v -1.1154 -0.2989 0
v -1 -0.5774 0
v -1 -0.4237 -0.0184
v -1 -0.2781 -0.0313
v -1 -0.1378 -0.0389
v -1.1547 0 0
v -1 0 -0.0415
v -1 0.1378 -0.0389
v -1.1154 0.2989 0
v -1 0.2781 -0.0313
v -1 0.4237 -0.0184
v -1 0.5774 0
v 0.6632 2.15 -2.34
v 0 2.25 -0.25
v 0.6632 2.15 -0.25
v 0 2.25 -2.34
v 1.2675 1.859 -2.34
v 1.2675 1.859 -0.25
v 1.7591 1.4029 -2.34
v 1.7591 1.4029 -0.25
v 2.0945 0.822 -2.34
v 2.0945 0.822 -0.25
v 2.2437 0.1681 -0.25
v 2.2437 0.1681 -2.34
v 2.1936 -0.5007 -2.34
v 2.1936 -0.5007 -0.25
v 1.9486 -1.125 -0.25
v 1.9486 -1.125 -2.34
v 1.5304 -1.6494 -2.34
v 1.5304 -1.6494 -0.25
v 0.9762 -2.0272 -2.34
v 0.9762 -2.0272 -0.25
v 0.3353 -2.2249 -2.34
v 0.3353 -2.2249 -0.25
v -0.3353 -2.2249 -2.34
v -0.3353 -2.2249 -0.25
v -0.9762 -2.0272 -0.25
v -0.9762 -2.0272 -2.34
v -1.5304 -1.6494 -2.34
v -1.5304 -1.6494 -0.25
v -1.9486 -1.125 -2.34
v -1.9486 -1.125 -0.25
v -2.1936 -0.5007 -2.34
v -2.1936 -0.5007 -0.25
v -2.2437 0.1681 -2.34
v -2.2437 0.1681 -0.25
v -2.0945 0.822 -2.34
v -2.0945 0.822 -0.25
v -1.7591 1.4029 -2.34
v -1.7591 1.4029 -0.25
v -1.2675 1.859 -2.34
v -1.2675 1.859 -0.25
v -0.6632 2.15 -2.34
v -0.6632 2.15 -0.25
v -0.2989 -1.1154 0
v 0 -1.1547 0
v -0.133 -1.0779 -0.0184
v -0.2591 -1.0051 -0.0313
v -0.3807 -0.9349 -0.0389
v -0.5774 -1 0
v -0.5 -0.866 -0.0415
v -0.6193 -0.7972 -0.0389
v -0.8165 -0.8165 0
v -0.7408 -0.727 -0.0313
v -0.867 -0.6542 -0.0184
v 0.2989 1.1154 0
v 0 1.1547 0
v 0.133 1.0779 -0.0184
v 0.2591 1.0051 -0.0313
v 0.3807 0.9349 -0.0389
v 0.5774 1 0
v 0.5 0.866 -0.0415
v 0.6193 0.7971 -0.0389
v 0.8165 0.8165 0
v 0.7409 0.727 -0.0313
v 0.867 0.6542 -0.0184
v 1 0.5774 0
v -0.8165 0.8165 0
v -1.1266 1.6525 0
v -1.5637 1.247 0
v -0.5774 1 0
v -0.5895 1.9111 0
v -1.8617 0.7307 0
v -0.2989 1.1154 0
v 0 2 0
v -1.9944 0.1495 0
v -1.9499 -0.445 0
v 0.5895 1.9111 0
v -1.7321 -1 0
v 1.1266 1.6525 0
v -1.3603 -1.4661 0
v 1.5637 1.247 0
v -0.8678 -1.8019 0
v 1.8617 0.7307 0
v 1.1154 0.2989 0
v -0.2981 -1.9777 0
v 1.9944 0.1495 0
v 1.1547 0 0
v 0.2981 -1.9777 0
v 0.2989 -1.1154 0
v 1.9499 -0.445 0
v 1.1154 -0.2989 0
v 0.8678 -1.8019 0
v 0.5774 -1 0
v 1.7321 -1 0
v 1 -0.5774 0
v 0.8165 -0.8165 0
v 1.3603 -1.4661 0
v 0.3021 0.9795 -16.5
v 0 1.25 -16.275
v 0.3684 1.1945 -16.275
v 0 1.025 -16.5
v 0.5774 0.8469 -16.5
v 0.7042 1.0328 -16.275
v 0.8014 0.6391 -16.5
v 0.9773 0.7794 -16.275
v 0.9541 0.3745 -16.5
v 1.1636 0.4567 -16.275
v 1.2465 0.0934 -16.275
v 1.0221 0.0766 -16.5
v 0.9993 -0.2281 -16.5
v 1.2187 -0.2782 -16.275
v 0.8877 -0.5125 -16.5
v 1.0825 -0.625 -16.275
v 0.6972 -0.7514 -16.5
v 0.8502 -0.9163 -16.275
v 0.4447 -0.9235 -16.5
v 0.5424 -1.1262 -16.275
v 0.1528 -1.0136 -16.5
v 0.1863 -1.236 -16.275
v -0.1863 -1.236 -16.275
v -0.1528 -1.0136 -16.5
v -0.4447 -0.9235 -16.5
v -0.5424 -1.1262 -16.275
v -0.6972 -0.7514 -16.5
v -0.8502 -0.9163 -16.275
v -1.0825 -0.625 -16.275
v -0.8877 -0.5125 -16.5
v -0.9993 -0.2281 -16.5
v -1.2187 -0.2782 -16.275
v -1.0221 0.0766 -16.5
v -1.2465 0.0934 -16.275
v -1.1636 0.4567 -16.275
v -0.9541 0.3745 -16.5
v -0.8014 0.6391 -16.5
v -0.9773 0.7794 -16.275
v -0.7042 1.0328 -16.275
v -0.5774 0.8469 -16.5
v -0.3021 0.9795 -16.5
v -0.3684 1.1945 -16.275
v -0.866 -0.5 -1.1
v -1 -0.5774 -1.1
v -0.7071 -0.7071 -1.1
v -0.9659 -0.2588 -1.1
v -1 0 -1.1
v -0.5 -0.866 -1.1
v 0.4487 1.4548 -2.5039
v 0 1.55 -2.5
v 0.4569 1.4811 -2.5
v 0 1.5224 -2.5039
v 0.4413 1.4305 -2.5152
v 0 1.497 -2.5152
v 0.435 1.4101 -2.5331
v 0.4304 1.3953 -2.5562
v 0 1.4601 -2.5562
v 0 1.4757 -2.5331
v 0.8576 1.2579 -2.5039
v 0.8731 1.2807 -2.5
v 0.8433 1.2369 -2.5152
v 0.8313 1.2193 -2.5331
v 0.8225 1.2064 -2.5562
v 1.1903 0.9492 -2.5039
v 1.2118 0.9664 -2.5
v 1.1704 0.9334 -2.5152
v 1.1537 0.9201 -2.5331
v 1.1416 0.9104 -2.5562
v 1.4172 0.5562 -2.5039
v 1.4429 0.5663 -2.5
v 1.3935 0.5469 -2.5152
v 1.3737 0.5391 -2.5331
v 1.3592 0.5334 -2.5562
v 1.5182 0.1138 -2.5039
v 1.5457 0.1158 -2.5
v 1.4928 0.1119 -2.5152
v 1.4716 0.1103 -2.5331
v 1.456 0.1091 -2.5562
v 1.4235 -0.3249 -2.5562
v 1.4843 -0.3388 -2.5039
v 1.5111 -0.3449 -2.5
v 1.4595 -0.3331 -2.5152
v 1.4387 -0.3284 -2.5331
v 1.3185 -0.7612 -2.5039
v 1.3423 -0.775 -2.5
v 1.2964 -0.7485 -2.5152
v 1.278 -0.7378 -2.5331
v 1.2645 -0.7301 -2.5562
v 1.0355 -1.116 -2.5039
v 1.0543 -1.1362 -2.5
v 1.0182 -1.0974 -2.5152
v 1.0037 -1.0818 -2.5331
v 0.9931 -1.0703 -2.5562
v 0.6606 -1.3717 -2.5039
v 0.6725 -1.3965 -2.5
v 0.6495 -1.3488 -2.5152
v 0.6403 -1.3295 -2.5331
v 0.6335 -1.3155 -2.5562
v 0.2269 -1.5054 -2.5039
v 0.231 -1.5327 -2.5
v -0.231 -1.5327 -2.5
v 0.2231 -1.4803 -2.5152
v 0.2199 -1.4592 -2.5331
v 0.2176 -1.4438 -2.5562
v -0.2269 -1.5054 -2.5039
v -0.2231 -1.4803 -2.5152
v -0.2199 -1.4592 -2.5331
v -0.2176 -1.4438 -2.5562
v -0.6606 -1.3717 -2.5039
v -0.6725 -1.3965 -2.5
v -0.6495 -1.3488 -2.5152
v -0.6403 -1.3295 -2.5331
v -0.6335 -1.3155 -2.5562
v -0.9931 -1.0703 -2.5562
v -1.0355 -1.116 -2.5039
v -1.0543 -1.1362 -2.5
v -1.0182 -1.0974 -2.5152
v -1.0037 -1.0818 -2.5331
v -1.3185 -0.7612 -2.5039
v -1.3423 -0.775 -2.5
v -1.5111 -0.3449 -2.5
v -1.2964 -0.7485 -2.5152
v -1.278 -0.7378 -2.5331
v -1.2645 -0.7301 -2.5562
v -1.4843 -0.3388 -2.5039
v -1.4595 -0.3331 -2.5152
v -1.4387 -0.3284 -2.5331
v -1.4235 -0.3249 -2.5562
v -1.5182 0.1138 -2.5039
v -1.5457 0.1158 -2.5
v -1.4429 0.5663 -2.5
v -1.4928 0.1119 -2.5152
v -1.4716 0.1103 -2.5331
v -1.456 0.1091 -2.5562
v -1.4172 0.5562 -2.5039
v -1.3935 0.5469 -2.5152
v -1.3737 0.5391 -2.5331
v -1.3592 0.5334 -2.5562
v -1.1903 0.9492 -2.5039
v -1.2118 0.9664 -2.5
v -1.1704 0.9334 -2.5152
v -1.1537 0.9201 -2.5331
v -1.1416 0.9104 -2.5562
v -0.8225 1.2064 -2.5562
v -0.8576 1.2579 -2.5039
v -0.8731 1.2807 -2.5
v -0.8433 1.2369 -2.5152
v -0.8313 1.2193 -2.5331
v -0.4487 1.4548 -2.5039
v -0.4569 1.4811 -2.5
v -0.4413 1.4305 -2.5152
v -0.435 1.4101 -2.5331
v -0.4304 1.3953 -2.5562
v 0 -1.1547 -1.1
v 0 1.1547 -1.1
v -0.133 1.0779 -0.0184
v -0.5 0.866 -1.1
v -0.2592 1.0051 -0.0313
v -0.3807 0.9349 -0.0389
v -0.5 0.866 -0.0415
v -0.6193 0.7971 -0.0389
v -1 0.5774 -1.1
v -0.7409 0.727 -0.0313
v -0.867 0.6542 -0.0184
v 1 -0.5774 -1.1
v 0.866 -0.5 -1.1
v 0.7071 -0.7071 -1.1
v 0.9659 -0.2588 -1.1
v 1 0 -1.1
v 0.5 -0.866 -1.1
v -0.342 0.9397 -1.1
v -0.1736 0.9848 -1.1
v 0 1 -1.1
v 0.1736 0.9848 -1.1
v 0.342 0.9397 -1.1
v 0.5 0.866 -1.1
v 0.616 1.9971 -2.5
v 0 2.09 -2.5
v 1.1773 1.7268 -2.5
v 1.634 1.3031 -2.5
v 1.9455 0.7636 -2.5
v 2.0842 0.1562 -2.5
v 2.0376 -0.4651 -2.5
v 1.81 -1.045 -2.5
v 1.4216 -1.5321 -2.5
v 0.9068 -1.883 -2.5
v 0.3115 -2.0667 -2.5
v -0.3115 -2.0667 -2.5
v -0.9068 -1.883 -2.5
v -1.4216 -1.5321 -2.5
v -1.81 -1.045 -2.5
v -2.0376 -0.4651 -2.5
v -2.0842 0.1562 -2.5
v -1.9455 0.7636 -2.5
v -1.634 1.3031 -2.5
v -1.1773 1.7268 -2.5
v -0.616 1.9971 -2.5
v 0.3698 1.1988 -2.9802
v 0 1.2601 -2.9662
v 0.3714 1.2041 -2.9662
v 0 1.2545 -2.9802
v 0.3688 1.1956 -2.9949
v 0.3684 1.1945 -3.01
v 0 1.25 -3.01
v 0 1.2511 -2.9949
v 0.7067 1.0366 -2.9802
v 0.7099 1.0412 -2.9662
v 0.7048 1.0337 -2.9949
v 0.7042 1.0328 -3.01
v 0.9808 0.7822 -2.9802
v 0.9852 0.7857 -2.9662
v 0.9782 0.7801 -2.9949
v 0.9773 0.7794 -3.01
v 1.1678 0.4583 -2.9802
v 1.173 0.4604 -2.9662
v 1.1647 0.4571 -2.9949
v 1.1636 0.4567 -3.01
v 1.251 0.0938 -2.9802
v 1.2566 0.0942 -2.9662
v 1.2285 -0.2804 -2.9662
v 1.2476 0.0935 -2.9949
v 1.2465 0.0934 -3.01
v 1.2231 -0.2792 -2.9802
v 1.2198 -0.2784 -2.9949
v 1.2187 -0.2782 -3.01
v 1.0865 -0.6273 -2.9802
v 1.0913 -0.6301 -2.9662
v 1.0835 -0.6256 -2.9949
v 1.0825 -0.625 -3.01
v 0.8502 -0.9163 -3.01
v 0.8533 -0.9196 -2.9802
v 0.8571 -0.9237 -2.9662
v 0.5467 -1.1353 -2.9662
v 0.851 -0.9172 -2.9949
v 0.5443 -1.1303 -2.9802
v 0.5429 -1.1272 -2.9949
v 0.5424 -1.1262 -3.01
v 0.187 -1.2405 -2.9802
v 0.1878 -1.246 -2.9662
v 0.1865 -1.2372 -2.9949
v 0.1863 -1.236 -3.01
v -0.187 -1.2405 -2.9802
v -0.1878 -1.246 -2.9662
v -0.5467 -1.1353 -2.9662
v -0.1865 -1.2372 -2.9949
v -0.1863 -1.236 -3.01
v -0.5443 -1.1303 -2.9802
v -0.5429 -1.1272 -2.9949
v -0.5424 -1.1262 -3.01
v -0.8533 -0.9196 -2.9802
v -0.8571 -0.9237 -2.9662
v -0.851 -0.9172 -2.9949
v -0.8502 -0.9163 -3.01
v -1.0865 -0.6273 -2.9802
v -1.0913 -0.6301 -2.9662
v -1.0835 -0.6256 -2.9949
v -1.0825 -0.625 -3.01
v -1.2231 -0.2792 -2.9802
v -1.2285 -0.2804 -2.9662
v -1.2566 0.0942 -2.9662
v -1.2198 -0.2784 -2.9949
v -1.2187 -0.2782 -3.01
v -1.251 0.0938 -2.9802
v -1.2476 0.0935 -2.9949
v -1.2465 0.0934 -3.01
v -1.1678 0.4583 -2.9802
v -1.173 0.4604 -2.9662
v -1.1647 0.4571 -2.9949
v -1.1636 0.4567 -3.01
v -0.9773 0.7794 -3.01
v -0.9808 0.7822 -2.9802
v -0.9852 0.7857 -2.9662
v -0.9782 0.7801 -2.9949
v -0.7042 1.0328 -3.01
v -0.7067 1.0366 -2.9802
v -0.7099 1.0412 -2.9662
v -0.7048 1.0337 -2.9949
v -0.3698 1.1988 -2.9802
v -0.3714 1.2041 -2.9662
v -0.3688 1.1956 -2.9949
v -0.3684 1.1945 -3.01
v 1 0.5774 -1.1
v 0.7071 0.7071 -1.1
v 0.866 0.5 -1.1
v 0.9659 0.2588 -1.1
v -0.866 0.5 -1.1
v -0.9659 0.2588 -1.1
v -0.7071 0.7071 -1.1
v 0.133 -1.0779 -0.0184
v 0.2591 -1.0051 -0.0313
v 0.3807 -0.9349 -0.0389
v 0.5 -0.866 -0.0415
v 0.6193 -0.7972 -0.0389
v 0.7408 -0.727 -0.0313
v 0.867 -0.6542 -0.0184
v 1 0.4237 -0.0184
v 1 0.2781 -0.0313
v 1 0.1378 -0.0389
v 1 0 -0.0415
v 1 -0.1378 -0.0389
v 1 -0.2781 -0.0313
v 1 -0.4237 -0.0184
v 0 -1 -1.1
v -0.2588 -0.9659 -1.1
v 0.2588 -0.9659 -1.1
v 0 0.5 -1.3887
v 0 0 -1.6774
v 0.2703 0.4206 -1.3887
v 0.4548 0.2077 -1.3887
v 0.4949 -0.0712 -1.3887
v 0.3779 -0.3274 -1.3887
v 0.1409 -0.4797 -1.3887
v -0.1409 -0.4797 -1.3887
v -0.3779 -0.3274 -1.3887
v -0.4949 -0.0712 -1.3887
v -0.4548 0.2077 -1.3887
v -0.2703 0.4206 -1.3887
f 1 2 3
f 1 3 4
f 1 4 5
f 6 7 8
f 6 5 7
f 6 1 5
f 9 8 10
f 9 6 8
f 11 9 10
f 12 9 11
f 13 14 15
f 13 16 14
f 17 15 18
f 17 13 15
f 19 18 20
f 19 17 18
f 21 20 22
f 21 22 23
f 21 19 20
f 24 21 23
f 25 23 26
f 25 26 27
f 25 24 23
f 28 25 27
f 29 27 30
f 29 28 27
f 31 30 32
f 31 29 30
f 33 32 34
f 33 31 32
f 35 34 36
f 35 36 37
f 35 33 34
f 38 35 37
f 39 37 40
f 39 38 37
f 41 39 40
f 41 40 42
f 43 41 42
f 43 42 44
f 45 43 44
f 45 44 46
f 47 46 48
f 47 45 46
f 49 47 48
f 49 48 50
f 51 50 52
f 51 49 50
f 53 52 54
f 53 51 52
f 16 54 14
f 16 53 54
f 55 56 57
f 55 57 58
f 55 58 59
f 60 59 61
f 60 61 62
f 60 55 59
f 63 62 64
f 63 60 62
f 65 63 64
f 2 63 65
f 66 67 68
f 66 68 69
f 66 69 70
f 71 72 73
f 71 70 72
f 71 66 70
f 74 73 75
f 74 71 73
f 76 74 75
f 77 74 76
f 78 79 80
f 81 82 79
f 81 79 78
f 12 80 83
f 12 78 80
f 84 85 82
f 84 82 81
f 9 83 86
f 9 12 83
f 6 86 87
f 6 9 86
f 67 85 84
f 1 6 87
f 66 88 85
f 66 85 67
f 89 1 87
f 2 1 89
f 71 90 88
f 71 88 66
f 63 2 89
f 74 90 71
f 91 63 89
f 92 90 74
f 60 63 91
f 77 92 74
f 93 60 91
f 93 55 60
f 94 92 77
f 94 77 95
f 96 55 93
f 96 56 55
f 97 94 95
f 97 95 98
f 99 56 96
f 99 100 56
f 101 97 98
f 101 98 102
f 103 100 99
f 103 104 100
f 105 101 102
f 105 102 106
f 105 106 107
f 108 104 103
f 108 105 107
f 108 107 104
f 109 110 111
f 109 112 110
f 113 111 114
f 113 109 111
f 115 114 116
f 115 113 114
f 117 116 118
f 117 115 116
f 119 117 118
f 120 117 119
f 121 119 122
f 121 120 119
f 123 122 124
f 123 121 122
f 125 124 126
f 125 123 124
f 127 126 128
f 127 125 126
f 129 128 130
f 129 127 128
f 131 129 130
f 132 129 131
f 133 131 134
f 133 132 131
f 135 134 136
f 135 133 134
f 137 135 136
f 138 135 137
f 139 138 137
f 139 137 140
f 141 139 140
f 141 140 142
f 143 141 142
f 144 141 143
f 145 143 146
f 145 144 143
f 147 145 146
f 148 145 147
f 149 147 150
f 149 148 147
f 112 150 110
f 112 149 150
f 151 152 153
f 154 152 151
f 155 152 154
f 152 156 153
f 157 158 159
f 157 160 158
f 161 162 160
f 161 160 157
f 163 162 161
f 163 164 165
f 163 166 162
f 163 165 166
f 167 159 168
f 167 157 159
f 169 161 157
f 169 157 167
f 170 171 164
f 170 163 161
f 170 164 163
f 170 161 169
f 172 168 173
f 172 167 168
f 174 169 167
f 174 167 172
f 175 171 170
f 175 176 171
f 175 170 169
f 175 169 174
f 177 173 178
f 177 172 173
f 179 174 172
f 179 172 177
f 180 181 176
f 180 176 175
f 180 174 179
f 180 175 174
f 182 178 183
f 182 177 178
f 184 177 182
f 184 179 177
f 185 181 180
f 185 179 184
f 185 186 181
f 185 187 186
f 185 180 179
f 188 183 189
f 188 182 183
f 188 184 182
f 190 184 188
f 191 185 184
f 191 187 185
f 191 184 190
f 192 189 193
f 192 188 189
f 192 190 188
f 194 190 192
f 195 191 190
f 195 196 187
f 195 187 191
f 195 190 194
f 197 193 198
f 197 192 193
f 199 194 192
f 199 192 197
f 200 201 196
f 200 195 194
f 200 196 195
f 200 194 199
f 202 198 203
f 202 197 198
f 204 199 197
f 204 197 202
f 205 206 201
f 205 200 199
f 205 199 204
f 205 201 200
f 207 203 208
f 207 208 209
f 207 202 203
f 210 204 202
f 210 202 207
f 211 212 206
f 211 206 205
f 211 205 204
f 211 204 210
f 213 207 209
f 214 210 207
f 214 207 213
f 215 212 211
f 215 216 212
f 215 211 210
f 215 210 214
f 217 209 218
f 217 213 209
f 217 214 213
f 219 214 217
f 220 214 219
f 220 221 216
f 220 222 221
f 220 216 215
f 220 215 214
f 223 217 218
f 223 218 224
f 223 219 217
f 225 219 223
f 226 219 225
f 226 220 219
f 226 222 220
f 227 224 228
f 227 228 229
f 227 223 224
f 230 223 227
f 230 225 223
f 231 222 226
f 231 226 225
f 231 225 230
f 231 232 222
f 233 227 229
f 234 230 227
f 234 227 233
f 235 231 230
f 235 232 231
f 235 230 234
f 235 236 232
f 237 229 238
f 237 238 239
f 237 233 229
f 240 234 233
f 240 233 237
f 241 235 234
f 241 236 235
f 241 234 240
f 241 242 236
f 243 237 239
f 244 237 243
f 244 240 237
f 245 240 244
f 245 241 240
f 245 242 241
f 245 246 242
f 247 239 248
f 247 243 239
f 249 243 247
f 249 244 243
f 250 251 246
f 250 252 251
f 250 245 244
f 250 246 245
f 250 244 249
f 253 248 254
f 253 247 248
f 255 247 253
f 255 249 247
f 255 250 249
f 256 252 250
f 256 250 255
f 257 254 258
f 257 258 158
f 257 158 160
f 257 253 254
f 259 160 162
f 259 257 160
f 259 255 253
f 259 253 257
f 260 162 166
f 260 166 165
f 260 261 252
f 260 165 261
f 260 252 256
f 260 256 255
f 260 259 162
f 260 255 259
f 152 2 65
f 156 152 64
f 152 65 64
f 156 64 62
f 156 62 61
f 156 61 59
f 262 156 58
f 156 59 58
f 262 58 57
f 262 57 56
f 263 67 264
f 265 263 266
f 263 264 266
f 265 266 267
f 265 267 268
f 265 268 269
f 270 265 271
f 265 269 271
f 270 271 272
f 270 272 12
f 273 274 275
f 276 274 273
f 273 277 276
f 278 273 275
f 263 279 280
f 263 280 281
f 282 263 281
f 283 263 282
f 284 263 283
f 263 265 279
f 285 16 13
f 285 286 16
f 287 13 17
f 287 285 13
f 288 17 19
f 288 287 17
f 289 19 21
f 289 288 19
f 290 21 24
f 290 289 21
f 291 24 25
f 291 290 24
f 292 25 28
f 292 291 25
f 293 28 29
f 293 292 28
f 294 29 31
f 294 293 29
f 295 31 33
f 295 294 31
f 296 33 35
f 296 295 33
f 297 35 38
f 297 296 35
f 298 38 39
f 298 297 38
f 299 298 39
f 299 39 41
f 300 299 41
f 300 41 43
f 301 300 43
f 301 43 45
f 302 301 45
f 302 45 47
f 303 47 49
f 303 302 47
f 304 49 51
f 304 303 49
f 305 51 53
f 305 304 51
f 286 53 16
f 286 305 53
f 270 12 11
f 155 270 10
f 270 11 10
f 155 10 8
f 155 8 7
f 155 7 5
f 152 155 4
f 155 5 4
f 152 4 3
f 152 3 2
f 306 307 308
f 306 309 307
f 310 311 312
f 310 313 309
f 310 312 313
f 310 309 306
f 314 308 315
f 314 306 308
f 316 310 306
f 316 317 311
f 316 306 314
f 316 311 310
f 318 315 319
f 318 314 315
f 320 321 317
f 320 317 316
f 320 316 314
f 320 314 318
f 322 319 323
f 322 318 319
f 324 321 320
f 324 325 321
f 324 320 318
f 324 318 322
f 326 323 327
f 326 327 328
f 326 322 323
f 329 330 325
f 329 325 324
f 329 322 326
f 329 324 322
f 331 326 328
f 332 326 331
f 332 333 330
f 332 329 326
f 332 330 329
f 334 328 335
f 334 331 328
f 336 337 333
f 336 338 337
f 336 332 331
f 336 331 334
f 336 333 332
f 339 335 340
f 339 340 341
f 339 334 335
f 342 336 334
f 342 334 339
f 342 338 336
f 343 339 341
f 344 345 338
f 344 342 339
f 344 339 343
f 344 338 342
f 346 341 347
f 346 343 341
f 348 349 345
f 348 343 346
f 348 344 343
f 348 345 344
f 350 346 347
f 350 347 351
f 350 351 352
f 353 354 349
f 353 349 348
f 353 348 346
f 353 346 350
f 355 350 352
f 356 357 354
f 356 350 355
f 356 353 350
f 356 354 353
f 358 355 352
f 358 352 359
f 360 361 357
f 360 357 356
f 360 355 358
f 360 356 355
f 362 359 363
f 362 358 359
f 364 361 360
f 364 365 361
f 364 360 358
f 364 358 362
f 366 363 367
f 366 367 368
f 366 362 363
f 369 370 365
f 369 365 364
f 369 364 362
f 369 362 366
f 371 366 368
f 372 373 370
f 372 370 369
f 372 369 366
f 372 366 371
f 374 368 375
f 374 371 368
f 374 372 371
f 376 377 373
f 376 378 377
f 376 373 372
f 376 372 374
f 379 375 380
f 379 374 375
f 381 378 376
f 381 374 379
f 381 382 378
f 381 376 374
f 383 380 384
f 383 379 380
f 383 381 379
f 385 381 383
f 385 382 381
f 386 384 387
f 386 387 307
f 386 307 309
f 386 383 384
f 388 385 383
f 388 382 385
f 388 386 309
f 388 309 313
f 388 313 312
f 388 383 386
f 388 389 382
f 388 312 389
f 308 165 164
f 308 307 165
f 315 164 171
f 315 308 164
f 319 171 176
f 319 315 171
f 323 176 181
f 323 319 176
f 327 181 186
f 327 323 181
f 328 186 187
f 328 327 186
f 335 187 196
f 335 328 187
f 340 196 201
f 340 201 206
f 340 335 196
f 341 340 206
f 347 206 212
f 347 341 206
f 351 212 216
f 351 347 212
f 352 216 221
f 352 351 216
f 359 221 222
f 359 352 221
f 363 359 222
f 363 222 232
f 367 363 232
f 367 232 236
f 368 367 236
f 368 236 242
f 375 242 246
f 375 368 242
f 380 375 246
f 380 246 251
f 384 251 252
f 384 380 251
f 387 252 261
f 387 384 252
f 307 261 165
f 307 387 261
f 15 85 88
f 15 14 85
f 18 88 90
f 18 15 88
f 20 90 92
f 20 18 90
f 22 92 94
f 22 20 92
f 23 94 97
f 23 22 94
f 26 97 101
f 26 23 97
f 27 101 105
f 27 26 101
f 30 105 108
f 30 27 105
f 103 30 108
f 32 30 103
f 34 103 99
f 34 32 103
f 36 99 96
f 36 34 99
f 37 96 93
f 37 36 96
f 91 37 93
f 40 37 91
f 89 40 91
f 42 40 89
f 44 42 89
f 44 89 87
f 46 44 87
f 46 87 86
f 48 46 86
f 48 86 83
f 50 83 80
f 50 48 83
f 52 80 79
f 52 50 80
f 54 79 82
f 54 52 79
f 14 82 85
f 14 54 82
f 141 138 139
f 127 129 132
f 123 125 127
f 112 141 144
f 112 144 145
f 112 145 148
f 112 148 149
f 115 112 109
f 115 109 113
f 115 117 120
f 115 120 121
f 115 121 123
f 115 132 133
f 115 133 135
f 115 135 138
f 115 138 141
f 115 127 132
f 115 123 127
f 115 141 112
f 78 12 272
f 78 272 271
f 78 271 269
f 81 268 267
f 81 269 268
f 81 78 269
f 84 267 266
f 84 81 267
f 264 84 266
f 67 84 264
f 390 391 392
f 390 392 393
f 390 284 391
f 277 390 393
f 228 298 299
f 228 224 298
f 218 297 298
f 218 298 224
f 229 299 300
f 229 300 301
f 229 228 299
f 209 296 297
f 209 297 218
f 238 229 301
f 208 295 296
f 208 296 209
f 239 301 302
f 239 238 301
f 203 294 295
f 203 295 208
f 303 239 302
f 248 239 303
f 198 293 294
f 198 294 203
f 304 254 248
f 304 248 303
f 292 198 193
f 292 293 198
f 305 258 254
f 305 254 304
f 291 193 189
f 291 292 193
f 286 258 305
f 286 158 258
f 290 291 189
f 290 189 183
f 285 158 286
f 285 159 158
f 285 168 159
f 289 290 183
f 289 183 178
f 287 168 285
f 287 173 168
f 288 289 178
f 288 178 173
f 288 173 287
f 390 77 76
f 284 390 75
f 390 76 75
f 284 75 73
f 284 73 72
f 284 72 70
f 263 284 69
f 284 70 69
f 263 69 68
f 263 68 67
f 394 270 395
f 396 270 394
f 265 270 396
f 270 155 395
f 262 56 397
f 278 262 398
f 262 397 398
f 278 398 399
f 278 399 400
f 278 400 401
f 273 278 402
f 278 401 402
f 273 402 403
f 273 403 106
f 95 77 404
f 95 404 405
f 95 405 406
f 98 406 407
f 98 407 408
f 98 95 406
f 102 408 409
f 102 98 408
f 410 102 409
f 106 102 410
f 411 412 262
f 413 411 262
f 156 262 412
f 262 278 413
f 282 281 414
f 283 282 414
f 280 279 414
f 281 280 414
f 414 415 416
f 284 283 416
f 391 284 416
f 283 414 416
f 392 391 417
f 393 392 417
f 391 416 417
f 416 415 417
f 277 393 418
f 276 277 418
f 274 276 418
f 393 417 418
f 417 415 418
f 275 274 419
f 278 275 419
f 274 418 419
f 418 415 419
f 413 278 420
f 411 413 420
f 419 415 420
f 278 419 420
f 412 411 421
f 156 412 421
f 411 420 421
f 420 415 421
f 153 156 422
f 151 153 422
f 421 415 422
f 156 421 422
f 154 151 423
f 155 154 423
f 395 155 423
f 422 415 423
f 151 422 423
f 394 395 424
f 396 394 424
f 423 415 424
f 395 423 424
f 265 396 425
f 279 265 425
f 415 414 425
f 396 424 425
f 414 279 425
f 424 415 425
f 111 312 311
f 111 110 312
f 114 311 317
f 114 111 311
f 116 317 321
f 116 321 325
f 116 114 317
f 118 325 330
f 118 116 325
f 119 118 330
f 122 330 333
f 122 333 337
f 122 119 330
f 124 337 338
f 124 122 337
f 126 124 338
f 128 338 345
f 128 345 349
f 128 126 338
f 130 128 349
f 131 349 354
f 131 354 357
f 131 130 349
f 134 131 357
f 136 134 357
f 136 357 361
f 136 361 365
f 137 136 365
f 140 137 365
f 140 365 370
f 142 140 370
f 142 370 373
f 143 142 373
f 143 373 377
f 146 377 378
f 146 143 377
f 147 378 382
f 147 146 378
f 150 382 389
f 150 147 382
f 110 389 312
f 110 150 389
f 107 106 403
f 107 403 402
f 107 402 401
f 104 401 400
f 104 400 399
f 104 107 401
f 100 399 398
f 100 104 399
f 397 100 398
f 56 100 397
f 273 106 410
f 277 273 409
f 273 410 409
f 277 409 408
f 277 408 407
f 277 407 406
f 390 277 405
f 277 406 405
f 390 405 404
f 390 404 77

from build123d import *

# Parameters (mm, degrees)
CUT_EXTRUDE1_DEPTH = 1.1


with BuildPart() as part:
    # Sketch1 → Revolve1 (revolve)
    with BuildSketch(Plane(origin=(0, 0, 0), x_dir=(0, 0, -1), z_dir=(1, 0, 0))):
        with BuildLine():
            Line((0, 0), (0, 2))
            Line((0, 2), (0.25, 2.25))
            Line((0.25, 2.25), (2.34, 2.25))
            Line((2.34, 2.25), (2.5, 2.09))
            Line((2.5, 2.09), (2.5, 1.55))
            ThreePointArc((2.5, 1.55), (2.515193643, 1.49701055), (2.556157637, 1.460123155))
            Line((2.556157637, 1.460123155), (2.966157637, 1.260123155))
            ThreePointArc((2.966157637, 1.260123155), (2.98750205, 1.25256365), (3.01, 1.25))
            Line((3.01, 1.25), (16.275, 1.25))
            Line((16.275, 1.25), (16.5, 1.025))
            Line((16.5, 1.025), (16.5, 0))
            Line((16.5, 0), (0, 0))
        make_face()
    revolve(axis=Axis((0, 0, 0), (0, 0, -1)))

    # Sketch2 → Cut-Extrude1 (cut)
    with BuildSketch(Plane.XY):
        Polygon((0, 1.154700538), (-1, 0.577350269), (-1, -0.577350269), (0, -1.154700538), (1, -0.577350269), (1, 0.577350269), align=None)
    extrude(amount=-CUT_EXTRUDE1_DEPTH, mode=Mode.SUBTRACT)

    # Sketch3 → Cut-Revolve2 (revolve, cut)
    with BuildSketch(Plane(origin=(0, 0, 0), x_dir=(0, 0, -1), z_dir=(1, 0, 0))):
        Polygon((1.1, 0), (1.1, 1), (1.677350269, 0), align=None)
    revolve(axis=Axis((0, 0, -1.1), (0, 0, -1)), mode=Mode.SUBTRACT)

    # Sketch4 → Cut-Revolve3 (revolve, cut)
    with BuildSketch(Plane(origin=(0, 0, 0), x_dir=(0, 0, -1), z_dir=(1, 0, 0))):
        Polygon((0, 1.154700538), (0, 1), (0.041451884, 1), align=None)
    revolve(axis=Axis((0, 0, 0), (0, 0, -1)), mode=Mode.SUBTRACT)


solid = part.part
